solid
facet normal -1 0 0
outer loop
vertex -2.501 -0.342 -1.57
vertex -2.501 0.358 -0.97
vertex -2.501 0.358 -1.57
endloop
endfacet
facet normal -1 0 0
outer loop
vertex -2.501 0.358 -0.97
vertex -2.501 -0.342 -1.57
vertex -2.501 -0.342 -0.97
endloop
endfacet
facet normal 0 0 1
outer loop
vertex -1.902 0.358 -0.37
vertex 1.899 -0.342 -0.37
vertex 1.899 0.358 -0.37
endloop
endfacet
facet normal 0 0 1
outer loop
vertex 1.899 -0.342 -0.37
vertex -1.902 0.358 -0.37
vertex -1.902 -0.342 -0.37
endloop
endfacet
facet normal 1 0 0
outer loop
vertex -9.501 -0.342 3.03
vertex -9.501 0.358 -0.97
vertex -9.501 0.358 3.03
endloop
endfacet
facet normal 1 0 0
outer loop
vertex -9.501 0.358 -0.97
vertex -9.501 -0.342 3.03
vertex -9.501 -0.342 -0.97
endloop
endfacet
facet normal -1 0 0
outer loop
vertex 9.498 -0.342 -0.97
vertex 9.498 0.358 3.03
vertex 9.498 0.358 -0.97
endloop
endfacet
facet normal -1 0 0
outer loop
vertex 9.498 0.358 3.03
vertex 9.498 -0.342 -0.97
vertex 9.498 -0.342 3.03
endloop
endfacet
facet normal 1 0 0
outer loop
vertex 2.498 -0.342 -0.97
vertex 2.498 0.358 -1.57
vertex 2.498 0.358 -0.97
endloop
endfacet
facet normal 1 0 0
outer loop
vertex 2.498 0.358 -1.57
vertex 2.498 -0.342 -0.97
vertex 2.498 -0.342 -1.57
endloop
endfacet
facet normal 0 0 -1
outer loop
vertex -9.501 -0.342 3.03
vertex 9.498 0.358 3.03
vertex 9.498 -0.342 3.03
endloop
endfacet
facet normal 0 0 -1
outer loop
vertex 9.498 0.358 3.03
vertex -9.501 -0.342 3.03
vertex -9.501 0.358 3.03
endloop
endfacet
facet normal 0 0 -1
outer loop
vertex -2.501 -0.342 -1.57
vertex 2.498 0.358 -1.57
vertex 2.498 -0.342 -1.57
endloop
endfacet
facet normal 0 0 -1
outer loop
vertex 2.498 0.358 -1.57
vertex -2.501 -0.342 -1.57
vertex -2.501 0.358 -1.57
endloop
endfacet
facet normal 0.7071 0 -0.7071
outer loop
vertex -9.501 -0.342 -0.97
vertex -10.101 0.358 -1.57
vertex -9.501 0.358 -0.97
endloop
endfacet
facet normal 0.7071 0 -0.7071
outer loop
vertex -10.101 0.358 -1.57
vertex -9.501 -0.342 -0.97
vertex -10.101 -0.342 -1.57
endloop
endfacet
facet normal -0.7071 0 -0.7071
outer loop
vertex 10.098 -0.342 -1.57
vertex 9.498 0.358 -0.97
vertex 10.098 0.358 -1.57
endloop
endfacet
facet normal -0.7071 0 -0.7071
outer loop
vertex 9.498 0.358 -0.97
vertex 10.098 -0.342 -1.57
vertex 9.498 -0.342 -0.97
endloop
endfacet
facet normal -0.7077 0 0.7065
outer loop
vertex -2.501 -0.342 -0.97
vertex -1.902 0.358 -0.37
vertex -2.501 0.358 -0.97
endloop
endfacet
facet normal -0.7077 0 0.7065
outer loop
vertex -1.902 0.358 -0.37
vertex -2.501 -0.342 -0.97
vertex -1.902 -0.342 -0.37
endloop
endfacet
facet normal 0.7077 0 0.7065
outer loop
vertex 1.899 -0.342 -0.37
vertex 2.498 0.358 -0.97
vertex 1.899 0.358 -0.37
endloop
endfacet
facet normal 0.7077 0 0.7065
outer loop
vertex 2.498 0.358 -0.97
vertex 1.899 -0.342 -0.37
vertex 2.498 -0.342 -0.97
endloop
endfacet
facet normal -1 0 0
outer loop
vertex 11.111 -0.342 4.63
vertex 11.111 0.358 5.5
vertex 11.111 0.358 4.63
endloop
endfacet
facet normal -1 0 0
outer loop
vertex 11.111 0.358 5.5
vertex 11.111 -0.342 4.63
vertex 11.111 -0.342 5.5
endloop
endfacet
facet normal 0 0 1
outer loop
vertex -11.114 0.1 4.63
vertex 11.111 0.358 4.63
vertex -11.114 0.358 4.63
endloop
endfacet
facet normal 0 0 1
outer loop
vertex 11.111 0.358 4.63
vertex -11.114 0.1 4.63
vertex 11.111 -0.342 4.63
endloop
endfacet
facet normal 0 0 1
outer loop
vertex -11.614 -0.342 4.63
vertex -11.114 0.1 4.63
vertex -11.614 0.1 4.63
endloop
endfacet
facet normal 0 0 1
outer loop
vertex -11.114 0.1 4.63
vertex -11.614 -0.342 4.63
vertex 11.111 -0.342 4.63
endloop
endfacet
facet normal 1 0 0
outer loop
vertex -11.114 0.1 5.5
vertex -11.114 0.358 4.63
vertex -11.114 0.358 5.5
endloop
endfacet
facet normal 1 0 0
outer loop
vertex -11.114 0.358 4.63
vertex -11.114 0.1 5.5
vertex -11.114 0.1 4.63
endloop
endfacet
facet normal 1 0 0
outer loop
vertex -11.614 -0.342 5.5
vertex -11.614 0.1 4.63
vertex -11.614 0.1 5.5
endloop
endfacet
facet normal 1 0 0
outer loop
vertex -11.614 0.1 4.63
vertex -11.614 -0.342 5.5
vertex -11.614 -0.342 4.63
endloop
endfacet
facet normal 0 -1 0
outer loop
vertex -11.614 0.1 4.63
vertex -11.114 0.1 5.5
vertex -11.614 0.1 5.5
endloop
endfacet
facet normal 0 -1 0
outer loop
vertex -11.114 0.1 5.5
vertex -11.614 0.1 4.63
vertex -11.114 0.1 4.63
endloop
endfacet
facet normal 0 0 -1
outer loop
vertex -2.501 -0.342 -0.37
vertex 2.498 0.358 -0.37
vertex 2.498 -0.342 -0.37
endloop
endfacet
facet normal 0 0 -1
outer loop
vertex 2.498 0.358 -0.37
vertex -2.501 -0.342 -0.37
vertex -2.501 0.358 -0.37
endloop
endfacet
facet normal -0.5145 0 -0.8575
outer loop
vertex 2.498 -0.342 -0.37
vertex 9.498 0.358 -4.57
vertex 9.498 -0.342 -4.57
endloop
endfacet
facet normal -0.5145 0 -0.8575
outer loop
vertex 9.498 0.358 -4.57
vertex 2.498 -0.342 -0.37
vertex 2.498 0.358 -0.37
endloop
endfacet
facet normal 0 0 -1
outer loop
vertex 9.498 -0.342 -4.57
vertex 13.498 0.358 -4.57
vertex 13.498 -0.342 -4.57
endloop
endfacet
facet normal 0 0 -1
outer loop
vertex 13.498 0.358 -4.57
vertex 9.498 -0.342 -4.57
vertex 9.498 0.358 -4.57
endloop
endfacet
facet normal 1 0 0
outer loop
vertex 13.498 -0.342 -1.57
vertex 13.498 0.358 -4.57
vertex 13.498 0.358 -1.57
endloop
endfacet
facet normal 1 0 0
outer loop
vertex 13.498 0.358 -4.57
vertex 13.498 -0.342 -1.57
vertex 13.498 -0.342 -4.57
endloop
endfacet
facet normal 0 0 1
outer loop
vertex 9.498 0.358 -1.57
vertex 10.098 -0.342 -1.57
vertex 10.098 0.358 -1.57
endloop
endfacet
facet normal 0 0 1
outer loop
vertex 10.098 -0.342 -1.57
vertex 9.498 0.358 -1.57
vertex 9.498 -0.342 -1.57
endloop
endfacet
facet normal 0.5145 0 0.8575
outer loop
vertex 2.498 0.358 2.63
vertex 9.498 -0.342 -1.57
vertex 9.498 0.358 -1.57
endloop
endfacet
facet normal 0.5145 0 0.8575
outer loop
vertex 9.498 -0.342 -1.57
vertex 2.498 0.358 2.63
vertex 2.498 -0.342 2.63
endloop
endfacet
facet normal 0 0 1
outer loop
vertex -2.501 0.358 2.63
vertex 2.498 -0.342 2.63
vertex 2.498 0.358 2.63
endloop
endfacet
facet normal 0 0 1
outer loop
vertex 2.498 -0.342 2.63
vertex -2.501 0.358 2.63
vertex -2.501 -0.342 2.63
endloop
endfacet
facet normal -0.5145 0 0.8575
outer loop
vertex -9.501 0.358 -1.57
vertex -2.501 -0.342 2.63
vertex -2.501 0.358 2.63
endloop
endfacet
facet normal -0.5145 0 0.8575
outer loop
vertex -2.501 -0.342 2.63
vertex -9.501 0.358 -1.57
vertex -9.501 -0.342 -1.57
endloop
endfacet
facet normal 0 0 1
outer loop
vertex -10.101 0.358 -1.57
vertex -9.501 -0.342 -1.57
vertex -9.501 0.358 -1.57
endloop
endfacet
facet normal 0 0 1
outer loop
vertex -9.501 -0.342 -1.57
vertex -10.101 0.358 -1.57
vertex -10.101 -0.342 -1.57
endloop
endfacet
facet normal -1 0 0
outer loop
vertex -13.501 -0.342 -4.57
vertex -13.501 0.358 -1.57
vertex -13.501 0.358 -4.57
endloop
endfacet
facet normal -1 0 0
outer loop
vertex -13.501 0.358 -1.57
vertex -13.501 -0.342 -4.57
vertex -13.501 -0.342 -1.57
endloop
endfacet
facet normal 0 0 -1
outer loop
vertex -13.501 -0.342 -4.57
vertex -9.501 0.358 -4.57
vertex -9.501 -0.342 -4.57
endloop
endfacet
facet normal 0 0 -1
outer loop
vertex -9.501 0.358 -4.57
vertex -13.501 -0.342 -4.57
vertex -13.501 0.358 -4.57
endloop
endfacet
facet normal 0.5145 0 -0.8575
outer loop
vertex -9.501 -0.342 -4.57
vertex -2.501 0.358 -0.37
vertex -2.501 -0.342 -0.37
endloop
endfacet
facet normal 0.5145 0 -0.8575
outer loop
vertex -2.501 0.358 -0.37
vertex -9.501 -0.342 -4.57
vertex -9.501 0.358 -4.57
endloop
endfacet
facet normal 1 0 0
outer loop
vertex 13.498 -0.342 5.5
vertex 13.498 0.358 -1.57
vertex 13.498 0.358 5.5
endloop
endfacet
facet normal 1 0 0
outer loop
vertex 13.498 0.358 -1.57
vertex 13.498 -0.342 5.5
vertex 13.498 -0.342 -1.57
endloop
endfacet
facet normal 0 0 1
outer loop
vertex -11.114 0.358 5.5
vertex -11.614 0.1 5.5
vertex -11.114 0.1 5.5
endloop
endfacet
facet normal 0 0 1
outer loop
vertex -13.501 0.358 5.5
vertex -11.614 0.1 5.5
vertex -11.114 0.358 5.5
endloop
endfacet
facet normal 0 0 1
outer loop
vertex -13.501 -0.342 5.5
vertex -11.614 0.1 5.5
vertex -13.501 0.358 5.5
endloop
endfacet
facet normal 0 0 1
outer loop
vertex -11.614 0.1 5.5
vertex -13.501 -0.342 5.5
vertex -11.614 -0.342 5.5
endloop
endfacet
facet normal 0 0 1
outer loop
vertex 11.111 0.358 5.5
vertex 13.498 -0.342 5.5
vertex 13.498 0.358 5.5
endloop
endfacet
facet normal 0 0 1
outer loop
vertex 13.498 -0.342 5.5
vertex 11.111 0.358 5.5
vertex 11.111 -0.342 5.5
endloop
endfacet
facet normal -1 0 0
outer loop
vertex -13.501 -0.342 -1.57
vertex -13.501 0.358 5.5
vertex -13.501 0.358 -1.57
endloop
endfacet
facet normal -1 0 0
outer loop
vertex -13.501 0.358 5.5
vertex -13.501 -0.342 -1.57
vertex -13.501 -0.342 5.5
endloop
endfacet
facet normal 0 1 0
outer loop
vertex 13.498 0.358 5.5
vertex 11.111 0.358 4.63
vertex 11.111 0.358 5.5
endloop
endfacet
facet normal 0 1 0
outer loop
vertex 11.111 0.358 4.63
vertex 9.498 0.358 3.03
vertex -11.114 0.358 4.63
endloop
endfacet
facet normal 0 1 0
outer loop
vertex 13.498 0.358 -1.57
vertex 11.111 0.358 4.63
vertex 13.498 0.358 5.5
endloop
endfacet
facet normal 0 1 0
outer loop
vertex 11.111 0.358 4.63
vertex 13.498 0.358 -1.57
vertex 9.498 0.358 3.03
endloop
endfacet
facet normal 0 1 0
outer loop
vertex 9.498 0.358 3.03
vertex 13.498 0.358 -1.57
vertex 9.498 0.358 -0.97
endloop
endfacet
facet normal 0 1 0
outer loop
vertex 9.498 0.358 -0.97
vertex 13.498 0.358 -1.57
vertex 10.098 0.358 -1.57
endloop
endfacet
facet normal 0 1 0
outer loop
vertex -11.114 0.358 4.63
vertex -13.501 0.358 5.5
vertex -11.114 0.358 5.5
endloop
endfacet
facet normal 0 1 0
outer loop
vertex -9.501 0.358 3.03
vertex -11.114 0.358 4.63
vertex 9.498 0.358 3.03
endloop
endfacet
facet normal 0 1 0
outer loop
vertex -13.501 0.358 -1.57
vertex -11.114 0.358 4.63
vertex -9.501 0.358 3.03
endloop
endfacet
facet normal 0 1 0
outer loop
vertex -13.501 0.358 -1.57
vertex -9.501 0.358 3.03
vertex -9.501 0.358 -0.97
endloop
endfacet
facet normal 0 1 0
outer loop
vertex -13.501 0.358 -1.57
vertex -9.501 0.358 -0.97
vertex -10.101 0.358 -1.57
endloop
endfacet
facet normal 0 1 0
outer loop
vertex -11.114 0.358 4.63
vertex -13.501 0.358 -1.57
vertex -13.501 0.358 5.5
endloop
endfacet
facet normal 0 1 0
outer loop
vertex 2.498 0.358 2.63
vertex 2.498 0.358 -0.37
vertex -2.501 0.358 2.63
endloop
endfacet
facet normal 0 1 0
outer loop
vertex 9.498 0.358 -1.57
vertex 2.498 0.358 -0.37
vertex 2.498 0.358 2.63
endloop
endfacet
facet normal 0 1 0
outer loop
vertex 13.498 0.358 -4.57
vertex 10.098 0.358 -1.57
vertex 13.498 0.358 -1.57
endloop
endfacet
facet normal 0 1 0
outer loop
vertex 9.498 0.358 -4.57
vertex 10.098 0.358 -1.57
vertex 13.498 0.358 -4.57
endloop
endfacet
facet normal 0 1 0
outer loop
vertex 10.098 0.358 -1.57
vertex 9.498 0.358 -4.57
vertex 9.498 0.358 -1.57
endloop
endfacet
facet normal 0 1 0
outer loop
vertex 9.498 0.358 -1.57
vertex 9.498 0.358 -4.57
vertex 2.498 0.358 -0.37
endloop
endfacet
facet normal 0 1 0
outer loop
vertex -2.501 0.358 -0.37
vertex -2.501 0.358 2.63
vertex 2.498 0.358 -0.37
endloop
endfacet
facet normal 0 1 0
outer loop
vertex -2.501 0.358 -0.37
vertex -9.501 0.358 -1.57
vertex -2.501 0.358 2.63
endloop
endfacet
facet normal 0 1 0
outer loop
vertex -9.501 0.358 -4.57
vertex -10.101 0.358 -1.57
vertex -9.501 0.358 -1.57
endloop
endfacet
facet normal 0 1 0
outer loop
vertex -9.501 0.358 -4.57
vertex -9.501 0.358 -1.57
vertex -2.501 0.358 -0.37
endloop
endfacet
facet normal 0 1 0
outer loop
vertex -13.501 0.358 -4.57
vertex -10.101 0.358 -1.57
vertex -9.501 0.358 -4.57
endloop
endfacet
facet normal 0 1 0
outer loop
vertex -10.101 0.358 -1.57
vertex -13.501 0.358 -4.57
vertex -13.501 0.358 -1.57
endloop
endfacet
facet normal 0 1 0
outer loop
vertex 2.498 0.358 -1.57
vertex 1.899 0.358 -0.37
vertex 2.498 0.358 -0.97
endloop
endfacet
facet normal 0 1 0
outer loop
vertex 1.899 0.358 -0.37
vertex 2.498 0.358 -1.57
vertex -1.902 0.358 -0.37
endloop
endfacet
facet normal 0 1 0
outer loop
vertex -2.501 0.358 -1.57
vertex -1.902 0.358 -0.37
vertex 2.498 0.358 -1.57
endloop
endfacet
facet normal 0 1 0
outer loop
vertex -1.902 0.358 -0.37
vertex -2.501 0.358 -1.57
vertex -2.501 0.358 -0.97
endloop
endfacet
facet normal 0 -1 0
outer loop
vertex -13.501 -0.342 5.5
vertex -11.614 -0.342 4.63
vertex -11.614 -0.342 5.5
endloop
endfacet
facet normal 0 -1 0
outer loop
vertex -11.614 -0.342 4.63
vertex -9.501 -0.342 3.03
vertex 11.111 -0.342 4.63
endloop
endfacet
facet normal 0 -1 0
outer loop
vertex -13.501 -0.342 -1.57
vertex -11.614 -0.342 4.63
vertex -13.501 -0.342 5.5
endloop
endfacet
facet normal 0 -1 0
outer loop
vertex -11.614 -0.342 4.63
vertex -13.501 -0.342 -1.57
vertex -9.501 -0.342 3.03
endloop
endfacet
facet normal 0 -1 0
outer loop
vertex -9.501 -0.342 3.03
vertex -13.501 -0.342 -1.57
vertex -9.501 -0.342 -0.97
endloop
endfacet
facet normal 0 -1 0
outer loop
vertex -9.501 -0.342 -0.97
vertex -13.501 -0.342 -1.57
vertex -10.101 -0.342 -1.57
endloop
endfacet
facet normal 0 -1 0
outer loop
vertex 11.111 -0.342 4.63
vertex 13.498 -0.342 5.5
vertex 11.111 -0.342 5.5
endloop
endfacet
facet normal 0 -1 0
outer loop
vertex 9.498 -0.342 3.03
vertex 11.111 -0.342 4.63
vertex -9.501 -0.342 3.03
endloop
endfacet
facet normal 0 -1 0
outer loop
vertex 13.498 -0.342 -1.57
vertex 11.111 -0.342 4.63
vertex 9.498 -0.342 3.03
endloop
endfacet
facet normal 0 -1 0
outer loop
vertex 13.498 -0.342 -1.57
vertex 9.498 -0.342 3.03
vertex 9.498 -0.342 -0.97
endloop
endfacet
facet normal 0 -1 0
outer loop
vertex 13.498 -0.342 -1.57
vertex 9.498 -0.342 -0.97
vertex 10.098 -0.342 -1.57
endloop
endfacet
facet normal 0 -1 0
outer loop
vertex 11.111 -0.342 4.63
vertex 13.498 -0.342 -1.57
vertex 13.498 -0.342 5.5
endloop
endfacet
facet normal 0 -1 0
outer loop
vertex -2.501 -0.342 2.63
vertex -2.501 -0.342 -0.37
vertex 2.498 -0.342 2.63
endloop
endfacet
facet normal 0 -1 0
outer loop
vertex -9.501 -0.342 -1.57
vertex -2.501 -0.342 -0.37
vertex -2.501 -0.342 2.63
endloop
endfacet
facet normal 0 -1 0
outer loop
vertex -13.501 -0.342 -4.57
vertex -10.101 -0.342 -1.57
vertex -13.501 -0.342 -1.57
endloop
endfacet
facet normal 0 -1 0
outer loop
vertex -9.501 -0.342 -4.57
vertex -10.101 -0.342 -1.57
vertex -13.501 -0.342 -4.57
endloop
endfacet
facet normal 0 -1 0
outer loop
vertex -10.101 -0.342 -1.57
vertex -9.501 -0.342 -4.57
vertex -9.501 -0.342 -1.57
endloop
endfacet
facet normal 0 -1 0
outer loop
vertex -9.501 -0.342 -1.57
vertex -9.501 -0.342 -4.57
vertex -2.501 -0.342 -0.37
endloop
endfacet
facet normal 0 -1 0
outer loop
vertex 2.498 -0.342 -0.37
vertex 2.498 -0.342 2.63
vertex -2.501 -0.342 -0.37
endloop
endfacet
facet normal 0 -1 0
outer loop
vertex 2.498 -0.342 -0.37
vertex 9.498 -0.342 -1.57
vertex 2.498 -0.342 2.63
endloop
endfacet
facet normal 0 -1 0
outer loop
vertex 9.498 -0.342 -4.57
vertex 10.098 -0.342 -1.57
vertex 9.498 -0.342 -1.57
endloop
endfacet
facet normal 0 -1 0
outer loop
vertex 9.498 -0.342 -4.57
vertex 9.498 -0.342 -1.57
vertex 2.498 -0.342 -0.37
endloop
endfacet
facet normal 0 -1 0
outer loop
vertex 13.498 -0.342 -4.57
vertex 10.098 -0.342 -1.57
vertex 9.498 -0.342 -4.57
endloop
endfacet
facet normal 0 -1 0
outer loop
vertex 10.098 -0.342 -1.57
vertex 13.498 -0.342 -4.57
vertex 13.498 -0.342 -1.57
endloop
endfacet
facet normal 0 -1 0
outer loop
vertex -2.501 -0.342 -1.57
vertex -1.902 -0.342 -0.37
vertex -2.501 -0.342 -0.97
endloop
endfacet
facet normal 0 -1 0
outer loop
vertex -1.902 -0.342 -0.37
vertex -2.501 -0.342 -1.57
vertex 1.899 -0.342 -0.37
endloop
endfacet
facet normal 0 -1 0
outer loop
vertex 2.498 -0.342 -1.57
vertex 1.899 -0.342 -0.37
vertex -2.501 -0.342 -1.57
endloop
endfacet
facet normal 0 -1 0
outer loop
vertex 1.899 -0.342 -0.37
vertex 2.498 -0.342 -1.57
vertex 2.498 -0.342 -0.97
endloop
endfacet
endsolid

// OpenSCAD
use <audio_vault_case.scad>;
translate([1.5, -7.4, 16.9]) band_cut_fold(4, 4, -11.4);
